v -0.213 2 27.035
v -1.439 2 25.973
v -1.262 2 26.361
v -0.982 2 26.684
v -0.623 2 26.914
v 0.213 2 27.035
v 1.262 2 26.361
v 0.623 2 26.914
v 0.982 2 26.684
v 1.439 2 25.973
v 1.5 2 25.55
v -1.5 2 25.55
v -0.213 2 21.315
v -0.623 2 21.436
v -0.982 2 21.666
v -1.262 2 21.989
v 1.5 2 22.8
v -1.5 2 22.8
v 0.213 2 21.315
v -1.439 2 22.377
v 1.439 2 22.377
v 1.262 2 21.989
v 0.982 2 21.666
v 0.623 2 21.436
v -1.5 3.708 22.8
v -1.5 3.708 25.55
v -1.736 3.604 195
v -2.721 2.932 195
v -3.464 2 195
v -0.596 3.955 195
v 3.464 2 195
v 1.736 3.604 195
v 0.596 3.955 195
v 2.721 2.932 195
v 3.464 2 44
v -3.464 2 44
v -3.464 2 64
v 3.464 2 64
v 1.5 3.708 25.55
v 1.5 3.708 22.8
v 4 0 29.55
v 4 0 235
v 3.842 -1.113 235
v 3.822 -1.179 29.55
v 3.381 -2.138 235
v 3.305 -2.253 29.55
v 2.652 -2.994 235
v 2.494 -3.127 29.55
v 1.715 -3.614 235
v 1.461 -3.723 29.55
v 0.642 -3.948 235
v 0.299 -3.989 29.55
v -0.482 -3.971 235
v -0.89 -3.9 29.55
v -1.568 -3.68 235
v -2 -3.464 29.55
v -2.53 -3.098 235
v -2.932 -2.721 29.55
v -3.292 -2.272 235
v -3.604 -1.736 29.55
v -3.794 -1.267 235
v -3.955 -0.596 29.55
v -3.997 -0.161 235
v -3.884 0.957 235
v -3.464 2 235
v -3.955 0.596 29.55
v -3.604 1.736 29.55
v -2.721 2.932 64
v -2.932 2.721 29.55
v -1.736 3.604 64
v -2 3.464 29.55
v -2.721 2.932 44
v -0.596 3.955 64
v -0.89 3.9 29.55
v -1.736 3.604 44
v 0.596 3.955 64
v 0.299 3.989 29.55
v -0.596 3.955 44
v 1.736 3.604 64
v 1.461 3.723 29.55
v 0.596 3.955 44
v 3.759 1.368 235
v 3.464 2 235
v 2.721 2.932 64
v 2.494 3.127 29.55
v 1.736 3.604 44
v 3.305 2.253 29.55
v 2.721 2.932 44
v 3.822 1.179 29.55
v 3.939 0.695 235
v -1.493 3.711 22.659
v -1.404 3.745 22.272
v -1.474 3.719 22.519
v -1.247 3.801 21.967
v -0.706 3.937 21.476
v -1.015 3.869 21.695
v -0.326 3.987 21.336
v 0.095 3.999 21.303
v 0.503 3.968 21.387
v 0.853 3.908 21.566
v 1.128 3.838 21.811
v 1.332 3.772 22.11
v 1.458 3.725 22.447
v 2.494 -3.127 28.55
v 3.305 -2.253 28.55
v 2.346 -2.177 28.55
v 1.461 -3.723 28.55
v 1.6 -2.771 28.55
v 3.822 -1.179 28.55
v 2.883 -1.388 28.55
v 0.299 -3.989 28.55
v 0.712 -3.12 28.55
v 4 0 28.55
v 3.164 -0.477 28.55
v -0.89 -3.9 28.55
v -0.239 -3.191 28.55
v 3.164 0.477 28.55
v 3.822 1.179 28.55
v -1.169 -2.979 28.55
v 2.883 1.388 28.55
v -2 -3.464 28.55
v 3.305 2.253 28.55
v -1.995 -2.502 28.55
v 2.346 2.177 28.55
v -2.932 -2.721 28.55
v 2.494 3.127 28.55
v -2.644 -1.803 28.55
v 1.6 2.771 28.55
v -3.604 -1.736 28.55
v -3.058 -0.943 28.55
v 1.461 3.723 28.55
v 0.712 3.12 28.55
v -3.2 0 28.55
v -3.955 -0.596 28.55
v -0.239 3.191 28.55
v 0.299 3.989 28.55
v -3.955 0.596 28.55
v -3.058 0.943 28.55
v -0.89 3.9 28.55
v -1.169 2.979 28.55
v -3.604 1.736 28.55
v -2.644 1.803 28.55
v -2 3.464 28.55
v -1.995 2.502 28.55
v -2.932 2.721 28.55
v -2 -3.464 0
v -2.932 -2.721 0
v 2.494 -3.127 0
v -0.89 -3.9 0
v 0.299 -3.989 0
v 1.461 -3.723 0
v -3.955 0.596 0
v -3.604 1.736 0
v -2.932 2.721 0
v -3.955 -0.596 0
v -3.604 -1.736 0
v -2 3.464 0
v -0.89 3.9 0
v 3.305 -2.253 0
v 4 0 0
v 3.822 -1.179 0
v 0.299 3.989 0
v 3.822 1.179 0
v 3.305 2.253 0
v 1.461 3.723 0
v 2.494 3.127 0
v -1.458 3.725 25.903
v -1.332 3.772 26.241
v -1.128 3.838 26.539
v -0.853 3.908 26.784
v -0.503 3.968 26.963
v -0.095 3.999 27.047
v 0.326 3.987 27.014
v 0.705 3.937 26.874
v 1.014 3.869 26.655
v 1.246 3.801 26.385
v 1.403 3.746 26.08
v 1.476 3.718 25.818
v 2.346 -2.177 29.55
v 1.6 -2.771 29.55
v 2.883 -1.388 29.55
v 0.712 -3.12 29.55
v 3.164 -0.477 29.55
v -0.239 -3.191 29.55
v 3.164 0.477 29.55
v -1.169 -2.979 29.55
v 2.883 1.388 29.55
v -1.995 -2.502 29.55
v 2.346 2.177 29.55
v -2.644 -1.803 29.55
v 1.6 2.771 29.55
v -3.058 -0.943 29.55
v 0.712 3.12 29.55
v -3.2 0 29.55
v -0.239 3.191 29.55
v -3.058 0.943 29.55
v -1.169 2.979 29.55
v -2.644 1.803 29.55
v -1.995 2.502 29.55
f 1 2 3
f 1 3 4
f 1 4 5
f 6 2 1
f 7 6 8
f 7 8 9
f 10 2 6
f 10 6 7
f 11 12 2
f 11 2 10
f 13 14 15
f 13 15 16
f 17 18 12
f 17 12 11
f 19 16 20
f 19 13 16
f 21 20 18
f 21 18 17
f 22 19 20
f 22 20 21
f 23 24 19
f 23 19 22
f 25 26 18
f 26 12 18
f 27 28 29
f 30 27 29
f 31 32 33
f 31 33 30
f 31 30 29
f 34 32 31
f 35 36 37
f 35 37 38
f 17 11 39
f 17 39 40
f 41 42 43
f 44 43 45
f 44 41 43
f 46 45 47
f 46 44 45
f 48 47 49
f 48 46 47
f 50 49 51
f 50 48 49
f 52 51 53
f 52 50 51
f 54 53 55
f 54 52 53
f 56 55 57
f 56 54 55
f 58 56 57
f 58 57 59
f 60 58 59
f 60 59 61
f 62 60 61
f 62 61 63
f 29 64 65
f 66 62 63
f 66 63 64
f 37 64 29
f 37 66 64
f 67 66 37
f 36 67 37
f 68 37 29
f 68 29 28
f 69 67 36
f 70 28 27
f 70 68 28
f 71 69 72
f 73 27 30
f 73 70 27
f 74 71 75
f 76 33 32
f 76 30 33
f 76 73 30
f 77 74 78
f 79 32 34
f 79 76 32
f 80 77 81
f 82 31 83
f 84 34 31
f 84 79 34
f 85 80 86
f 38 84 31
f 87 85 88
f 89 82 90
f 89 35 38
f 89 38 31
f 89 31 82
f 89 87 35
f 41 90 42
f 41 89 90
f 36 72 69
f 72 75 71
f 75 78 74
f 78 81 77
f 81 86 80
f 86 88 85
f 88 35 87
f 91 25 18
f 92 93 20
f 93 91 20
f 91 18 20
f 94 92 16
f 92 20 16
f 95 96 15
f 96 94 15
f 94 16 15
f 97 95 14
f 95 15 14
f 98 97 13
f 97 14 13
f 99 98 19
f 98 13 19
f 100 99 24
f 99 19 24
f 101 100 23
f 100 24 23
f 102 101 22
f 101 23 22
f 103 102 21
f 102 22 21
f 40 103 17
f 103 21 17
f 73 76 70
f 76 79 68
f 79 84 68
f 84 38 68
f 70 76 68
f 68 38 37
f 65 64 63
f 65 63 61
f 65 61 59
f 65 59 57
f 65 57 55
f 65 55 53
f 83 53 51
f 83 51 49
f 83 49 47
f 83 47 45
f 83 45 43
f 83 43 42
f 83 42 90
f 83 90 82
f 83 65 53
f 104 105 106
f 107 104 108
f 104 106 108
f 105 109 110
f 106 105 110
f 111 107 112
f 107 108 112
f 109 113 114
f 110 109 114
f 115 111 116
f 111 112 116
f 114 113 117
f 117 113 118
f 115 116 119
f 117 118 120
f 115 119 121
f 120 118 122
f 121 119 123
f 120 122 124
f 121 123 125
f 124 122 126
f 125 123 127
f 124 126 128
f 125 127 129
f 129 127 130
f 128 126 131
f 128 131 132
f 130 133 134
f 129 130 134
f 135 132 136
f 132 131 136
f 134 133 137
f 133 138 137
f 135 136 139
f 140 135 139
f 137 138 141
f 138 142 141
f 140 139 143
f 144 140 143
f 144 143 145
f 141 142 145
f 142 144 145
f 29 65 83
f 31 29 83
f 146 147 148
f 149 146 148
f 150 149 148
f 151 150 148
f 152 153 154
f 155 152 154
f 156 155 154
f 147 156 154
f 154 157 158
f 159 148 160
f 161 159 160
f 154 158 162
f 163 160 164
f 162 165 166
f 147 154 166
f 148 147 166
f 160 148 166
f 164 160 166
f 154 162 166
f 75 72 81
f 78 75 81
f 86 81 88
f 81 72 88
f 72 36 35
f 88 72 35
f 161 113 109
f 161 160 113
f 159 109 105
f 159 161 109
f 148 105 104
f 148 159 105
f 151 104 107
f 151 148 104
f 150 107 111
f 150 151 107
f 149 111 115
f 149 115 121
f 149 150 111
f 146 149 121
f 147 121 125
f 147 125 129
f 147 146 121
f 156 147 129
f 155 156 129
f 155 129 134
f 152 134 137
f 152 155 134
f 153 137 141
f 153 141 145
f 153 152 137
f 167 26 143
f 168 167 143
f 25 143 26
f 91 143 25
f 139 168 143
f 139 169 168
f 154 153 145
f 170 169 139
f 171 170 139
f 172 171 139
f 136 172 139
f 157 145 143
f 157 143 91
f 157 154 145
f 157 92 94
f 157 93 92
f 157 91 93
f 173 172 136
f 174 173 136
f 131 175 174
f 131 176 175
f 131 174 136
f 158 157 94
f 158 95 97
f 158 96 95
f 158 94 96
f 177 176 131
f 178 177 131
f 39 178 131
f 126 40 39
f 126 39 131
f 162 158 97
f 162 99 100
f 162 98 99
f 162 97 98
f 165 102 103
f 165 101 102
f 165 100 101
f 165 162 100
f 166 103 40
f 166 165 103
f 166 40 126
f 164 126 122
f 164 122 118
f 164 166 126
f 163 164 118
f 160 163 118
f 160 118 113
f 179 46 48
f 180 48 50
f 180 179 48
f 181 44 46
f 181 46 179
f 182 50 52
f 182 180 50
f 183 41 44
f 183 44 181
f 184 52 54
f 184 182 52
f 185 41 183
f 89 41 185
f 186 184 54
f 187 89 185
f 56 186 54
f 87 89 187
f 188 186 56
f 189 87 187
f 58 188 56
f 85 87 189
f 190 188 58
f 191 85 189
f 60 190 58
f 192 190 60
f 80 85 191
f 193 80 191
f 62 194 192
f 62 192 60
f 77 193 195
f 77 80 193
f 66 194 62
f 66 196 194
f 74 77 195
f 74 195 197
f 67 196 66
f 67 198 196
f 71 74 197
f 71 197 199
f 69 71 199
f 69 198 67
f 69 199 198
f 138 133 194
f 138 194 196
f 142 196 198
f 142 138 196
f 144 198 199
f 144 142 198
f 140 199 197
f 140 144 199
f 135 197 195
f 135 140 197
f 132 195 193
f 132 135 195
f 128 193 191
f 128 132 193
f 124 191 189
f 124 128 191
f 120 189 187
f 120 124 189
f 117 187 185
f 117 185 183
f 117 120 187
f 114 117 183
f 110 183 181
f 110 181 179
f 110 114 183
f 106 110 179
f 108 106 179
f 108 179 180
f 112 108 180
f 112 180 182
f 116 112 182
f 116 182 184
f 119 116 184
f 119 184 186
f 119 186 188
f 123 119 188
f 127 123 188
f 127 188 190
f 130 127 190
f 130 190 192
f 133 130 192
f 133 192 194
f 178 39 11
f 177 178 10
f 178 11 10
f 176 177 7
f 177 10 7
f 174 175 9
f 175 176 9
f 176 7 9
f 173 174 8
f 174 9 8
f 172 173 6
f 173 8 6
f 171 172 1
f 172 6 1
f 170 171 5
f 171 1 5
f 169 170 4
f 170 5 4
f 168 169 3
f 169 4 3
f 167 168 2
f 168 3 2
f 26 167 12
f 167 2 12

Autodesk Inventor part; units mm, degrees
ref_plane "YZ Plane" through (0, 0, 0) normal (1, 0, 0) x (0, 1, 0)
ref_plane "XZ Plane" through (0, 0, 0) normal (0, 1, 0) x (-1, 0, 0)
sketch "Sketch1" plane through (0, 0, 0) normal (0, 0, 1) x (1, 0, 0)
  circle A0 centre (0, 0) radius 4
  dimension "d0" = 8
extrude "Extrusion1" add sketch "Sketch1" along normal blind 235
sketch "Sketch5" plane through (0, 0, 235) normal (0, 0, 1) x (1, 0, 0)
  circle A0 centre (0, 0) radius 4 projected
  line L0 (-3.4641, 2) -> (3.4641, 2)
  arc A1 (3.4641, 2) -> (-3.4641, 2) centre (0, 0) ccw
  dimension "d18" = 2
extrude "Extrusion5" cut sketch "Sketch5" against normal blind 40 contours L0 A0 picked at (-0.1548, 2.6577)
sketch "Sketch7" plane through (-3.4641, 2, 235) normal (0, 1, 0) x (1, 0, 0)
  circle A0 centre (3.4641, 209.45) radius 1.5
  circle A1 centre (3.4641, 212.2) radius 1.5
  line L0 (1.9641, 209.45) -> (1.9641, 212.2)
  line L1 (4.9641, 209.45) -> (4.9641, 212.2)
  line L2 (-0.5359, 235) -> (-0.5359, 0) projected
  line L3 (7.4641, 235) -> (7.4641, 0) projected
  line L4 (-0.5359, 191) -> (7.4641, 191)
  line L5 (7.4641, 191) -> (7.4641, 171)
  line L6 (7.4641, 171) -> (-0.5359, 171)
  line L7 (-0.5359, 171) -> (-0.5359, 191)
  point P0 (3.4641, 235)
  dimension "d21" = 3
  dimension "d22" = 3
  dimension "d23" = 2.75
  dimension "d24" = 22.8
  dimension "d25" = 20
  dimension "d26" = 44
extrude "Extrusion6" cut sketch "Sketch7" along normal through all
ref_plane "Work Plane1" through (0, 0, 28.55) normal (0, 0, -1) x (-1, 0, 0)
sketch "Sketch8" plane through (0, 0, 28.55) normal (0, 0, -1) x (-1, 0, 0)
  circle A0 centre (0, 0) radius 4 projected
  circle A1 centre (0, 0) radius 3.2
  dimension "d30" = 0.8
extrude "Extrusion7" cut sketch "Sketch8" against normal blind 1
properties part number "AA054" material "Aluminum 6061"
